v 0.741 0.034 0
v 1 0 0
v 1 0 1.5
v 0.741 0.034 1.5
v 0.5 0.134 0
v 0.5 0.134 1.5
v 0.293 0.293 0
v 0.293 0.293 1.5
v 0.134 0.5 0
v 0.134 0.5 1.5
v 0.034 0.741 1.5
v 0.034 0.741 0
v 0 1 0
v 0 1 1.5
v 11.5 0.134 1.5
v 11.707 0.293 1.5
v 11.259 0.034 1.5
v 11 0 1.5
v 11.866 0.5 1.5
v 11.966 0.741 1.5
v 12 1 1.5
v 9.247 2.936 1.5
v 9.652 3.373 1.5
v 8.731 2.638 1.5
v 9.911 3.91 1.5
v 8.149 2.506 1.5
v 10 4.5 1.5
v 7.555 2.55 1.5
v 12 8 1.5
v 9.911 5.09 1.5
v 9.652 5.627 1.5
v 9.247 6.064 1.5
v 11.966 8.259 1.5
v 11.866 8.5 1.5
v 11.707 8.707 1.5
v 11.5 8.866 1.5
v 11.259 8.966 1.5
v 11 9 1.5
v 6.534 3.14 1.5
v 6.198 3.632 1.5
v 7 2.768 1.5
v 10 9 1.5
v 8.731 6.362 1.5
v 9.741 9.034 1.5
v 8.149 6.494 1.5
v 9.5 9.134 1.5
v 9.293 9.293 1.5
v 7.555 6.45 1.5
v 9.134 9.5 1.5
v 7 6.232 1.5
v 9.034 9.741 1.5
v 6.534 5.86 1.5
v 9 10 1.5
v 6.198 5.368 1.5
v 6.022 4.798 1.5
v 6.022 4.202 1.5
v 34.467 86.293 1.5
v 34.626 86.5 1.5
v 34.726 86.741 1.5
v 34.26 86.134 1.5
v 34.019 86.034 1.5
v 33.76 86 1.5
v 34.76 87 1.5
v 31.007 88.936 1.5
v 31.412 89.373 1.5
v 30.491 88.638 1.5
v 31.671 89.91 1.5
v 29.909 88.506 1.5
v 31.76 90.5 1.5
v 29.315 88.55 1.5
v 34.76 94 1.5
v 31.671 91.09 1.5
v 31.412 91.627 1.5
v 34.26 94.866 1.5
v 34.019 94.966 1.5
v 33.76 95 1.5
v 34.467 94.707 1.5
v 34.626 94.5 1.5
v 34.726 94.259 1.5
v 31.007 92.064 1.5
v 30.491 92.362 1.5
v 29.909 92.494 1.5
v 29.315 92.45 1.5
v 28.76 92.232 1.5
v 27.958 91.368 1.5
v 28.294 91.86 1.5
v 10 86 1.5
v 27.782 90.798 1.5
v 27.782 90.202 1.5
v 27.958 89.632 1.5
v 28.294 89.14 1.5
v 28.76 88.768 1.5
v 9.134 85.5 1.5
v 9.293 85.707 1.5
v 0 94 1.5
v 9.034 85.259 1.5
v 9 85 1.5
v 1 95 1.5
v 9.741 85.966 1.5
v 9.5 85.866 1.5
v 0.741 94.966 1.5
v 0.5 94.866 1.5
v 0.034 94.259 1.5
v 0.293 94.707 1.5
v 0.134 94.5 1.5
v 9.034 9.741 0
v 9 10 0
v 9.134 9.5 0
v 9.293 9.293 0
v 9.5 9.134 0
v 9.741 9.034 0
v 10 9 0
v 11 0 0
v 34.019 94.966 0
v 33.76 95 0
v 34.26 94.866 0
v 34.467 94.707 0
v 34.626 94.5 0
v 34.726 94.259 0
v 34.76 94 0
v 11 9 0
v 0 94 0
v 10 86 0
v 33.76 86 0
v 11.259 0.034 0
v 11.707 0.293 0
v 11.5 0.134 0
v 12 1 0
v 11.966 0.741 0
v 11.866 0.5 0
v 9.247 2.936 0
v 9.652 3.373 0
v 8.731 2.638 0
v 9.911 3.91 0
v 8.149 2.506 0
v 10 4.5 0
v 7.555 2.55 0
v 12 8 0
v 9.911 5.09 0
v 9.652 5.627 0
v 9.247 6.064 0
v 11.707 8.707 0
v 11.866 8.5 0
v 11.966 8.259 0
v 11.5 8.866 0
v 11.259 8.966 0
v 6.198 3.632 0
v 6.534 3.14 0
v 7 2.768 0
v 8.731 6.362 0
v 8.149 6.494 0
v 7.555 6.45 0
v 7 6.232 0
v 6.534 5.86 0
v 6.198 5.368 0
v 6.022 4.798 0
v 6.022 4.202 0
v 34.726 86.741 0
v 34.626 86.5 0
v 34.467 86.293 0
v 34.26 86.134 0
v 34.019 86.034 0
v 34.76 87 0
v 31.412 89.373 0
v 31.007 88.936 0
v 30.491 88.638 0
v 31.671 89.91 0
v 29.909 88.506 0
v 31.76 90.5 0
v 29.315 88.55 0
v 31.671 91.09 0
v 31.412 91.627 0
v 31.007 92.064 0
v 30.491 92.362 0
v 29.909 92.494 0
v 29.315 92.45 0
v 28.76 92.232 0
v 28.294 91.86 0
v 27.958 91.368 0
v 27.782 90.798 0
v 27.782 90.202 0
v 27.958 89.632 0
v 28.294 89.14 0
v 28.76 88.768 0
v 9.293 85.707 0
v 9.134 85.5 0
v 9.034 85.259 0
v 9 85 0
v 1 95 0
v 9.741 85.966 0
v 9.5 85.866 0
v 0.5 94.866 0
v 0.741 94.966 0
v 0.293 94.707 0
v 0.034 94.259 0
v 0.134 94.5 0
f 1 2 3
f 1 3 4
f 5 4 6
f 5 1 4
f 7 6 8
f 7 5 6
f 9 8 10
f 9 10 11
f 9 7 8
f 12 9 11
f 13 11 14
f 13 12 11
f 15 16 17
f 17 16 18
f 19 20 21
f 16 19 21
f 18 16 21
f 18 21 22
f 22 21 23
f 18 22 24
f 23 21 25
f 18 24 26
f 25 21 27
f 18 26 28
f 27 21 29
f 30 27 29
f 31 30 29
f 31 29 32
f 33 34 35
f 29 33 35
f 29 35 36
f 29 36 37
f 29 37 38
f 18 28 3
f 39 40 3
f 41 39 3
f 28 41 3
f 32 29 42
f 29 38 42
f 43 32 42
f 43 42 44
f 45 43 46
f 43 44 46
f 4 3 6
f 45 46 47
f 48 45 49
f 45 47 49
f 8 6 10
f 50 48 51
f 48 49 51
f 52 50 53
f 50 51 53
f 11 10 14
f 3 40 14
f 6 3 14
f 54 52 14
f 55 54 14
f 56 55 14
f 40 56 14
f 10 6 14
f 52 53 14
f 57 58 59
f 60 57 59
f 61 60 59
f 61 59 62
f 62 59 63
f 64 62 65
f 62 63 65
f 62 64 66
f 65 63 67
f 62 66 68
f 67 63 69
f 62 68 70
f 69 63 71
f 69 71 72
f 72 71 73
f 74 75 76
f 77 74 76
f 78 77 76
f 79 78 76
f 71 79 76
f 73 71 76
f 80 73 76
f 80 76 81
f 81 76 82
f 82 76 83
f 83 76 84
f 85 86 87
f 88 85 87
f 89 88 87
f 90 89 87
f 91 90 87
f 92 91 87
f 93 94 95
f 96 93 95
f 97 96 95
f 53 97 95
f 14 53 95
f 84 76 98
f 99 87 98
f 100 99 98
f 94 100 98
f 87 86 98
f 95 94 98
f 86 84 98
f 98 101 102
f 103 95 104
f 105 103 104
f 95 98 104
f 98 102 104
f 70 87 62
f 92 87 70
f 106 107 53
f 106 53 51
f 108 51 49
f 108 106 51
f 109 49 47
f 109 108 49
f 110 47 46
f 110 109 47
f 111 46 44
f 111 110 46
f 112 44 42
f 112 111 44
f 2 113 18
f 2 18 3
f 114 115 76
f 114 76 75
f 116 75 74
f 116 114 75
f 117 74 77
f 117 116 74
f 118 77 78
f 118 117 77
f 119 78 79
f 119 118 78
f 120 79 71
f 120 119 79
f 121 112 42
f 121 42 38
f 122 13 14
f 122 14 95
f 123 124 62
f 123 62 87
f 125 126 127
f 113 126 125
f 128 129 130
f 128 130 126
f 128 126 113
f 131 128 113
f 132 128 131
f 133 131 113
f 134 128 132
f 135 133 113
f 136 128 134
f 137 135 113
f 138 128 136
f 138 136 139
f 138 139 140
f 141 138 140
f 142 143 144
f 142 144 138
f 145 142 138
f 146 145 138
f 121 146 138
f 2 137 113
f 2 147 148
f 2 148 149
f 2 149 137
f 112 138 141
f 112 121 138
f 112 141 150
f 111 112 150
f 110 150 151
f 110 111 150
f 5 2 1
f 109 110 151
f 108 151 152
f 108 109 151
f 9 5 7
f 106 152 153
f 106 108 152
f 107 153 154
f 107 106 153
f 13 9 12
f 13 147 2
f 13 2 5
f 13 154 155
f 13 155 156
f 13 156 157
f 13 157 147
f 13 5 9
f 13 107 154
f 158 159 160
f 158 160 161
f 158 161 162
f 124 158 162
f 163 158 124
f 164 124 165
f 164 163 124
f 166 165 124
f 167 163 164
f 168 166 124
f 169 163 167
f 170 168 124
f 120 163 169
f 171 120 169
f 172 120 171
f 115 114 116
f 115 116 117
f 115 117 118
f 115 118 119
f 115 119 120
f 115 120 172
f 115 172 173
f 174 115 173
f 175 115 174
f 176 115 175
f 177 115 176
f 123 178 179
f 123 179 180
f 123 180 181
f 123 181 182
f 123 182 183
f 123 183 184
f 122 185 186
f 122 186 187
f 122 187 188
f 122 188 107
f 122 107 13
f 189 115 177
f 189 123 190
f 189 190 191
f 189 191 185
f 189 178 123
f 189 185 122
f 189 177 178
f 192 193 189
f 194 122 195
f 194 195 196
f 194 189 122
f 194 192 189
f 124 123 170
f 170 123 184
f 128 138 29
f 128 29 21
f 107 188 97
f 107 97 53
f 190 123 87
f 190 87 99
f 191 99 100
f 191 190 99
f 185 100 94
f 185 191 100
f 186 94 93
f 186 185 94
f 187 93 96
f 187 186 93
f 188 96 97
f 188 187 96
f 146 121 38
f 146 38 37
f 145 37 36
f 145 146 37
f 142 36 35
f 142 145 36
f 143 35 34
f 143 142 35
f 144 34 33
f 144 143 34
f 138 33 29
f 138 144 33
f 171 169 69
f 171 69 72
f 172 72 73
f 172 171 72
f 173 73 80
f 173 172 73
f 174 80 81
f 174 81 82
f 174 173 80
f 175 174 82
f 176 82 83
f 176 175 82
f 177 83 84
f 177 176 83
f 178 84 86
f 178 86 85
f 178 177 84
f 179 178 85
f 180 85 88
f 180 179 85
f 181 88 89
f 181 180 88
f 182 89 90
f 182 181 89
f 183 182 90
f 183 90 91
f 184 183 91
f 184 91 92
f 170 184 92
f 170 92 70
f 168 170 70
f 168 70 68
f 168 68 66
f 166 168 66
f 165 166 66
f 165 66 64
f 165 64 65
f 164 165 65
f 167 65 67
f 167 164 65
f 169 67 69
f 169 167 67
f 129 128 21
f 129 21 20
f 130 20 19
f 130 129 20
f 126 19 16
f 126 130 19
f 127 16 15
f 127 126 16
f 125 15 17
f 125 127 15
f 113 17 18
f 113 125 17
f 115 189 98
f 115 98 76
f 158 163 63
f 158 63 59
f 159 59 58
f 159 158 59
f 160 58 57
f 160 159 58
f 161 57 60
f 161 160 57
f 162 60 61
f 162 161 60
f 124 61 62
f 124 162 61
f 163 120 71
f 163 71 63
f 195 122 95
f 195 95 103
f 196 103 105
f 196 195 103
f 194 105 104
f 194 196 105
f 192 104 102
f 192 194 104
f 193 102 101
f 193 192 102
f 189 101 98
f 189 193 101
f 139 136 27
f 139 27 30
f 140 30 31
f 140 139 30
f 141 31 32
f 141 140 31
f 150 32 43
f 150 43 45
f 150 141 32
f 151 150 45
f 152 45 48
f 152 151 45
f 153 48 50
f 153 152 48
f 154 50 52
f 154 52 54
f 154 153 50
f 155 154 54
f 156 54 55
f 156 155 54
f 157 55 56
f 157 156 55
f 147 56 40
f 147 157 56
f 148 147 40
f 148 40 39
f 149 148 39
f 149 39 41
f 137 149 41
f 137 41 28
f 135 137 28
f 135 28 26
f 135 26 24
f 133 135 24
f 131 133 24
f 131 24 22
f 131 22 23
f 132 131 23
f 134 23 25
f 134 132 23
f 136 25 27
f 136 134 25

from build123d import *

# Parameters (mm, degrees)
SKETCH1_R           = 2
BOSS_EXTRUDE1_DEPTH = 1.5


with BuildPart() as part:
    # Sketch1 → Boss-Extrude1 (new body)
    with BuildSketch(Plane.XY):
        with BuildLine():
            Line((12, 8), (12, 1))
            ThreePointArc((12, 1), (11.707106781, 0.292893219), (11, 0))
            Line((11, 0), (1, 0))
            ThreePointArc((1, 0), (0.292893219, 0.292893219), (0, 1))
            Line((0, 1), (0, 94.000005673))
            ThreePointArc((0, 94.000005673), (0.292893219, 94.707112454), (1, 95.000005673))
            Line((1, 95.000005673), (33.760008368, 95.000005673))
            ThreePointArc((33.760008368, 95.000005673), (34.467115149, 94.707112454), (34.760008368, 94.000005673))
            Line((34.760008368, 94.000005673), (34.760008368, 87.000005673))
            ThreePointArc((34.760008368, 87.000005673), (34.467115149, 86.292898892), (33.760008368, 86.000005673))
            Line((33.760008368, 86.000005673), (10, 86.000005673))
            ThreePointArc((10, 86.000005673), (9.292893219, 85.707112454), (9, 85.000005673))
            Line((9, 85.000005673), (9, 10))
            ThreePointArc((9, 10), (9.292893219, 9.292893219), (10, 9))
            Line((10, 9), (11, 9))
            ThreePointArc((11, 9), (11.707106781, 8.707106781), (12, 8))
        make_face()
        with Locations((29.760008368, 90.500005673)):
            Circle(SKETCH1_R, mode=Mode.SUBTRACT)
        with Locations((8, 4.5)):
            Circle(SKETCH1_R, mode=Mode.SUBTRACT)
    extrude(amount=BOSS_EXTRUDE1_DEPTH)


solid = part.part
